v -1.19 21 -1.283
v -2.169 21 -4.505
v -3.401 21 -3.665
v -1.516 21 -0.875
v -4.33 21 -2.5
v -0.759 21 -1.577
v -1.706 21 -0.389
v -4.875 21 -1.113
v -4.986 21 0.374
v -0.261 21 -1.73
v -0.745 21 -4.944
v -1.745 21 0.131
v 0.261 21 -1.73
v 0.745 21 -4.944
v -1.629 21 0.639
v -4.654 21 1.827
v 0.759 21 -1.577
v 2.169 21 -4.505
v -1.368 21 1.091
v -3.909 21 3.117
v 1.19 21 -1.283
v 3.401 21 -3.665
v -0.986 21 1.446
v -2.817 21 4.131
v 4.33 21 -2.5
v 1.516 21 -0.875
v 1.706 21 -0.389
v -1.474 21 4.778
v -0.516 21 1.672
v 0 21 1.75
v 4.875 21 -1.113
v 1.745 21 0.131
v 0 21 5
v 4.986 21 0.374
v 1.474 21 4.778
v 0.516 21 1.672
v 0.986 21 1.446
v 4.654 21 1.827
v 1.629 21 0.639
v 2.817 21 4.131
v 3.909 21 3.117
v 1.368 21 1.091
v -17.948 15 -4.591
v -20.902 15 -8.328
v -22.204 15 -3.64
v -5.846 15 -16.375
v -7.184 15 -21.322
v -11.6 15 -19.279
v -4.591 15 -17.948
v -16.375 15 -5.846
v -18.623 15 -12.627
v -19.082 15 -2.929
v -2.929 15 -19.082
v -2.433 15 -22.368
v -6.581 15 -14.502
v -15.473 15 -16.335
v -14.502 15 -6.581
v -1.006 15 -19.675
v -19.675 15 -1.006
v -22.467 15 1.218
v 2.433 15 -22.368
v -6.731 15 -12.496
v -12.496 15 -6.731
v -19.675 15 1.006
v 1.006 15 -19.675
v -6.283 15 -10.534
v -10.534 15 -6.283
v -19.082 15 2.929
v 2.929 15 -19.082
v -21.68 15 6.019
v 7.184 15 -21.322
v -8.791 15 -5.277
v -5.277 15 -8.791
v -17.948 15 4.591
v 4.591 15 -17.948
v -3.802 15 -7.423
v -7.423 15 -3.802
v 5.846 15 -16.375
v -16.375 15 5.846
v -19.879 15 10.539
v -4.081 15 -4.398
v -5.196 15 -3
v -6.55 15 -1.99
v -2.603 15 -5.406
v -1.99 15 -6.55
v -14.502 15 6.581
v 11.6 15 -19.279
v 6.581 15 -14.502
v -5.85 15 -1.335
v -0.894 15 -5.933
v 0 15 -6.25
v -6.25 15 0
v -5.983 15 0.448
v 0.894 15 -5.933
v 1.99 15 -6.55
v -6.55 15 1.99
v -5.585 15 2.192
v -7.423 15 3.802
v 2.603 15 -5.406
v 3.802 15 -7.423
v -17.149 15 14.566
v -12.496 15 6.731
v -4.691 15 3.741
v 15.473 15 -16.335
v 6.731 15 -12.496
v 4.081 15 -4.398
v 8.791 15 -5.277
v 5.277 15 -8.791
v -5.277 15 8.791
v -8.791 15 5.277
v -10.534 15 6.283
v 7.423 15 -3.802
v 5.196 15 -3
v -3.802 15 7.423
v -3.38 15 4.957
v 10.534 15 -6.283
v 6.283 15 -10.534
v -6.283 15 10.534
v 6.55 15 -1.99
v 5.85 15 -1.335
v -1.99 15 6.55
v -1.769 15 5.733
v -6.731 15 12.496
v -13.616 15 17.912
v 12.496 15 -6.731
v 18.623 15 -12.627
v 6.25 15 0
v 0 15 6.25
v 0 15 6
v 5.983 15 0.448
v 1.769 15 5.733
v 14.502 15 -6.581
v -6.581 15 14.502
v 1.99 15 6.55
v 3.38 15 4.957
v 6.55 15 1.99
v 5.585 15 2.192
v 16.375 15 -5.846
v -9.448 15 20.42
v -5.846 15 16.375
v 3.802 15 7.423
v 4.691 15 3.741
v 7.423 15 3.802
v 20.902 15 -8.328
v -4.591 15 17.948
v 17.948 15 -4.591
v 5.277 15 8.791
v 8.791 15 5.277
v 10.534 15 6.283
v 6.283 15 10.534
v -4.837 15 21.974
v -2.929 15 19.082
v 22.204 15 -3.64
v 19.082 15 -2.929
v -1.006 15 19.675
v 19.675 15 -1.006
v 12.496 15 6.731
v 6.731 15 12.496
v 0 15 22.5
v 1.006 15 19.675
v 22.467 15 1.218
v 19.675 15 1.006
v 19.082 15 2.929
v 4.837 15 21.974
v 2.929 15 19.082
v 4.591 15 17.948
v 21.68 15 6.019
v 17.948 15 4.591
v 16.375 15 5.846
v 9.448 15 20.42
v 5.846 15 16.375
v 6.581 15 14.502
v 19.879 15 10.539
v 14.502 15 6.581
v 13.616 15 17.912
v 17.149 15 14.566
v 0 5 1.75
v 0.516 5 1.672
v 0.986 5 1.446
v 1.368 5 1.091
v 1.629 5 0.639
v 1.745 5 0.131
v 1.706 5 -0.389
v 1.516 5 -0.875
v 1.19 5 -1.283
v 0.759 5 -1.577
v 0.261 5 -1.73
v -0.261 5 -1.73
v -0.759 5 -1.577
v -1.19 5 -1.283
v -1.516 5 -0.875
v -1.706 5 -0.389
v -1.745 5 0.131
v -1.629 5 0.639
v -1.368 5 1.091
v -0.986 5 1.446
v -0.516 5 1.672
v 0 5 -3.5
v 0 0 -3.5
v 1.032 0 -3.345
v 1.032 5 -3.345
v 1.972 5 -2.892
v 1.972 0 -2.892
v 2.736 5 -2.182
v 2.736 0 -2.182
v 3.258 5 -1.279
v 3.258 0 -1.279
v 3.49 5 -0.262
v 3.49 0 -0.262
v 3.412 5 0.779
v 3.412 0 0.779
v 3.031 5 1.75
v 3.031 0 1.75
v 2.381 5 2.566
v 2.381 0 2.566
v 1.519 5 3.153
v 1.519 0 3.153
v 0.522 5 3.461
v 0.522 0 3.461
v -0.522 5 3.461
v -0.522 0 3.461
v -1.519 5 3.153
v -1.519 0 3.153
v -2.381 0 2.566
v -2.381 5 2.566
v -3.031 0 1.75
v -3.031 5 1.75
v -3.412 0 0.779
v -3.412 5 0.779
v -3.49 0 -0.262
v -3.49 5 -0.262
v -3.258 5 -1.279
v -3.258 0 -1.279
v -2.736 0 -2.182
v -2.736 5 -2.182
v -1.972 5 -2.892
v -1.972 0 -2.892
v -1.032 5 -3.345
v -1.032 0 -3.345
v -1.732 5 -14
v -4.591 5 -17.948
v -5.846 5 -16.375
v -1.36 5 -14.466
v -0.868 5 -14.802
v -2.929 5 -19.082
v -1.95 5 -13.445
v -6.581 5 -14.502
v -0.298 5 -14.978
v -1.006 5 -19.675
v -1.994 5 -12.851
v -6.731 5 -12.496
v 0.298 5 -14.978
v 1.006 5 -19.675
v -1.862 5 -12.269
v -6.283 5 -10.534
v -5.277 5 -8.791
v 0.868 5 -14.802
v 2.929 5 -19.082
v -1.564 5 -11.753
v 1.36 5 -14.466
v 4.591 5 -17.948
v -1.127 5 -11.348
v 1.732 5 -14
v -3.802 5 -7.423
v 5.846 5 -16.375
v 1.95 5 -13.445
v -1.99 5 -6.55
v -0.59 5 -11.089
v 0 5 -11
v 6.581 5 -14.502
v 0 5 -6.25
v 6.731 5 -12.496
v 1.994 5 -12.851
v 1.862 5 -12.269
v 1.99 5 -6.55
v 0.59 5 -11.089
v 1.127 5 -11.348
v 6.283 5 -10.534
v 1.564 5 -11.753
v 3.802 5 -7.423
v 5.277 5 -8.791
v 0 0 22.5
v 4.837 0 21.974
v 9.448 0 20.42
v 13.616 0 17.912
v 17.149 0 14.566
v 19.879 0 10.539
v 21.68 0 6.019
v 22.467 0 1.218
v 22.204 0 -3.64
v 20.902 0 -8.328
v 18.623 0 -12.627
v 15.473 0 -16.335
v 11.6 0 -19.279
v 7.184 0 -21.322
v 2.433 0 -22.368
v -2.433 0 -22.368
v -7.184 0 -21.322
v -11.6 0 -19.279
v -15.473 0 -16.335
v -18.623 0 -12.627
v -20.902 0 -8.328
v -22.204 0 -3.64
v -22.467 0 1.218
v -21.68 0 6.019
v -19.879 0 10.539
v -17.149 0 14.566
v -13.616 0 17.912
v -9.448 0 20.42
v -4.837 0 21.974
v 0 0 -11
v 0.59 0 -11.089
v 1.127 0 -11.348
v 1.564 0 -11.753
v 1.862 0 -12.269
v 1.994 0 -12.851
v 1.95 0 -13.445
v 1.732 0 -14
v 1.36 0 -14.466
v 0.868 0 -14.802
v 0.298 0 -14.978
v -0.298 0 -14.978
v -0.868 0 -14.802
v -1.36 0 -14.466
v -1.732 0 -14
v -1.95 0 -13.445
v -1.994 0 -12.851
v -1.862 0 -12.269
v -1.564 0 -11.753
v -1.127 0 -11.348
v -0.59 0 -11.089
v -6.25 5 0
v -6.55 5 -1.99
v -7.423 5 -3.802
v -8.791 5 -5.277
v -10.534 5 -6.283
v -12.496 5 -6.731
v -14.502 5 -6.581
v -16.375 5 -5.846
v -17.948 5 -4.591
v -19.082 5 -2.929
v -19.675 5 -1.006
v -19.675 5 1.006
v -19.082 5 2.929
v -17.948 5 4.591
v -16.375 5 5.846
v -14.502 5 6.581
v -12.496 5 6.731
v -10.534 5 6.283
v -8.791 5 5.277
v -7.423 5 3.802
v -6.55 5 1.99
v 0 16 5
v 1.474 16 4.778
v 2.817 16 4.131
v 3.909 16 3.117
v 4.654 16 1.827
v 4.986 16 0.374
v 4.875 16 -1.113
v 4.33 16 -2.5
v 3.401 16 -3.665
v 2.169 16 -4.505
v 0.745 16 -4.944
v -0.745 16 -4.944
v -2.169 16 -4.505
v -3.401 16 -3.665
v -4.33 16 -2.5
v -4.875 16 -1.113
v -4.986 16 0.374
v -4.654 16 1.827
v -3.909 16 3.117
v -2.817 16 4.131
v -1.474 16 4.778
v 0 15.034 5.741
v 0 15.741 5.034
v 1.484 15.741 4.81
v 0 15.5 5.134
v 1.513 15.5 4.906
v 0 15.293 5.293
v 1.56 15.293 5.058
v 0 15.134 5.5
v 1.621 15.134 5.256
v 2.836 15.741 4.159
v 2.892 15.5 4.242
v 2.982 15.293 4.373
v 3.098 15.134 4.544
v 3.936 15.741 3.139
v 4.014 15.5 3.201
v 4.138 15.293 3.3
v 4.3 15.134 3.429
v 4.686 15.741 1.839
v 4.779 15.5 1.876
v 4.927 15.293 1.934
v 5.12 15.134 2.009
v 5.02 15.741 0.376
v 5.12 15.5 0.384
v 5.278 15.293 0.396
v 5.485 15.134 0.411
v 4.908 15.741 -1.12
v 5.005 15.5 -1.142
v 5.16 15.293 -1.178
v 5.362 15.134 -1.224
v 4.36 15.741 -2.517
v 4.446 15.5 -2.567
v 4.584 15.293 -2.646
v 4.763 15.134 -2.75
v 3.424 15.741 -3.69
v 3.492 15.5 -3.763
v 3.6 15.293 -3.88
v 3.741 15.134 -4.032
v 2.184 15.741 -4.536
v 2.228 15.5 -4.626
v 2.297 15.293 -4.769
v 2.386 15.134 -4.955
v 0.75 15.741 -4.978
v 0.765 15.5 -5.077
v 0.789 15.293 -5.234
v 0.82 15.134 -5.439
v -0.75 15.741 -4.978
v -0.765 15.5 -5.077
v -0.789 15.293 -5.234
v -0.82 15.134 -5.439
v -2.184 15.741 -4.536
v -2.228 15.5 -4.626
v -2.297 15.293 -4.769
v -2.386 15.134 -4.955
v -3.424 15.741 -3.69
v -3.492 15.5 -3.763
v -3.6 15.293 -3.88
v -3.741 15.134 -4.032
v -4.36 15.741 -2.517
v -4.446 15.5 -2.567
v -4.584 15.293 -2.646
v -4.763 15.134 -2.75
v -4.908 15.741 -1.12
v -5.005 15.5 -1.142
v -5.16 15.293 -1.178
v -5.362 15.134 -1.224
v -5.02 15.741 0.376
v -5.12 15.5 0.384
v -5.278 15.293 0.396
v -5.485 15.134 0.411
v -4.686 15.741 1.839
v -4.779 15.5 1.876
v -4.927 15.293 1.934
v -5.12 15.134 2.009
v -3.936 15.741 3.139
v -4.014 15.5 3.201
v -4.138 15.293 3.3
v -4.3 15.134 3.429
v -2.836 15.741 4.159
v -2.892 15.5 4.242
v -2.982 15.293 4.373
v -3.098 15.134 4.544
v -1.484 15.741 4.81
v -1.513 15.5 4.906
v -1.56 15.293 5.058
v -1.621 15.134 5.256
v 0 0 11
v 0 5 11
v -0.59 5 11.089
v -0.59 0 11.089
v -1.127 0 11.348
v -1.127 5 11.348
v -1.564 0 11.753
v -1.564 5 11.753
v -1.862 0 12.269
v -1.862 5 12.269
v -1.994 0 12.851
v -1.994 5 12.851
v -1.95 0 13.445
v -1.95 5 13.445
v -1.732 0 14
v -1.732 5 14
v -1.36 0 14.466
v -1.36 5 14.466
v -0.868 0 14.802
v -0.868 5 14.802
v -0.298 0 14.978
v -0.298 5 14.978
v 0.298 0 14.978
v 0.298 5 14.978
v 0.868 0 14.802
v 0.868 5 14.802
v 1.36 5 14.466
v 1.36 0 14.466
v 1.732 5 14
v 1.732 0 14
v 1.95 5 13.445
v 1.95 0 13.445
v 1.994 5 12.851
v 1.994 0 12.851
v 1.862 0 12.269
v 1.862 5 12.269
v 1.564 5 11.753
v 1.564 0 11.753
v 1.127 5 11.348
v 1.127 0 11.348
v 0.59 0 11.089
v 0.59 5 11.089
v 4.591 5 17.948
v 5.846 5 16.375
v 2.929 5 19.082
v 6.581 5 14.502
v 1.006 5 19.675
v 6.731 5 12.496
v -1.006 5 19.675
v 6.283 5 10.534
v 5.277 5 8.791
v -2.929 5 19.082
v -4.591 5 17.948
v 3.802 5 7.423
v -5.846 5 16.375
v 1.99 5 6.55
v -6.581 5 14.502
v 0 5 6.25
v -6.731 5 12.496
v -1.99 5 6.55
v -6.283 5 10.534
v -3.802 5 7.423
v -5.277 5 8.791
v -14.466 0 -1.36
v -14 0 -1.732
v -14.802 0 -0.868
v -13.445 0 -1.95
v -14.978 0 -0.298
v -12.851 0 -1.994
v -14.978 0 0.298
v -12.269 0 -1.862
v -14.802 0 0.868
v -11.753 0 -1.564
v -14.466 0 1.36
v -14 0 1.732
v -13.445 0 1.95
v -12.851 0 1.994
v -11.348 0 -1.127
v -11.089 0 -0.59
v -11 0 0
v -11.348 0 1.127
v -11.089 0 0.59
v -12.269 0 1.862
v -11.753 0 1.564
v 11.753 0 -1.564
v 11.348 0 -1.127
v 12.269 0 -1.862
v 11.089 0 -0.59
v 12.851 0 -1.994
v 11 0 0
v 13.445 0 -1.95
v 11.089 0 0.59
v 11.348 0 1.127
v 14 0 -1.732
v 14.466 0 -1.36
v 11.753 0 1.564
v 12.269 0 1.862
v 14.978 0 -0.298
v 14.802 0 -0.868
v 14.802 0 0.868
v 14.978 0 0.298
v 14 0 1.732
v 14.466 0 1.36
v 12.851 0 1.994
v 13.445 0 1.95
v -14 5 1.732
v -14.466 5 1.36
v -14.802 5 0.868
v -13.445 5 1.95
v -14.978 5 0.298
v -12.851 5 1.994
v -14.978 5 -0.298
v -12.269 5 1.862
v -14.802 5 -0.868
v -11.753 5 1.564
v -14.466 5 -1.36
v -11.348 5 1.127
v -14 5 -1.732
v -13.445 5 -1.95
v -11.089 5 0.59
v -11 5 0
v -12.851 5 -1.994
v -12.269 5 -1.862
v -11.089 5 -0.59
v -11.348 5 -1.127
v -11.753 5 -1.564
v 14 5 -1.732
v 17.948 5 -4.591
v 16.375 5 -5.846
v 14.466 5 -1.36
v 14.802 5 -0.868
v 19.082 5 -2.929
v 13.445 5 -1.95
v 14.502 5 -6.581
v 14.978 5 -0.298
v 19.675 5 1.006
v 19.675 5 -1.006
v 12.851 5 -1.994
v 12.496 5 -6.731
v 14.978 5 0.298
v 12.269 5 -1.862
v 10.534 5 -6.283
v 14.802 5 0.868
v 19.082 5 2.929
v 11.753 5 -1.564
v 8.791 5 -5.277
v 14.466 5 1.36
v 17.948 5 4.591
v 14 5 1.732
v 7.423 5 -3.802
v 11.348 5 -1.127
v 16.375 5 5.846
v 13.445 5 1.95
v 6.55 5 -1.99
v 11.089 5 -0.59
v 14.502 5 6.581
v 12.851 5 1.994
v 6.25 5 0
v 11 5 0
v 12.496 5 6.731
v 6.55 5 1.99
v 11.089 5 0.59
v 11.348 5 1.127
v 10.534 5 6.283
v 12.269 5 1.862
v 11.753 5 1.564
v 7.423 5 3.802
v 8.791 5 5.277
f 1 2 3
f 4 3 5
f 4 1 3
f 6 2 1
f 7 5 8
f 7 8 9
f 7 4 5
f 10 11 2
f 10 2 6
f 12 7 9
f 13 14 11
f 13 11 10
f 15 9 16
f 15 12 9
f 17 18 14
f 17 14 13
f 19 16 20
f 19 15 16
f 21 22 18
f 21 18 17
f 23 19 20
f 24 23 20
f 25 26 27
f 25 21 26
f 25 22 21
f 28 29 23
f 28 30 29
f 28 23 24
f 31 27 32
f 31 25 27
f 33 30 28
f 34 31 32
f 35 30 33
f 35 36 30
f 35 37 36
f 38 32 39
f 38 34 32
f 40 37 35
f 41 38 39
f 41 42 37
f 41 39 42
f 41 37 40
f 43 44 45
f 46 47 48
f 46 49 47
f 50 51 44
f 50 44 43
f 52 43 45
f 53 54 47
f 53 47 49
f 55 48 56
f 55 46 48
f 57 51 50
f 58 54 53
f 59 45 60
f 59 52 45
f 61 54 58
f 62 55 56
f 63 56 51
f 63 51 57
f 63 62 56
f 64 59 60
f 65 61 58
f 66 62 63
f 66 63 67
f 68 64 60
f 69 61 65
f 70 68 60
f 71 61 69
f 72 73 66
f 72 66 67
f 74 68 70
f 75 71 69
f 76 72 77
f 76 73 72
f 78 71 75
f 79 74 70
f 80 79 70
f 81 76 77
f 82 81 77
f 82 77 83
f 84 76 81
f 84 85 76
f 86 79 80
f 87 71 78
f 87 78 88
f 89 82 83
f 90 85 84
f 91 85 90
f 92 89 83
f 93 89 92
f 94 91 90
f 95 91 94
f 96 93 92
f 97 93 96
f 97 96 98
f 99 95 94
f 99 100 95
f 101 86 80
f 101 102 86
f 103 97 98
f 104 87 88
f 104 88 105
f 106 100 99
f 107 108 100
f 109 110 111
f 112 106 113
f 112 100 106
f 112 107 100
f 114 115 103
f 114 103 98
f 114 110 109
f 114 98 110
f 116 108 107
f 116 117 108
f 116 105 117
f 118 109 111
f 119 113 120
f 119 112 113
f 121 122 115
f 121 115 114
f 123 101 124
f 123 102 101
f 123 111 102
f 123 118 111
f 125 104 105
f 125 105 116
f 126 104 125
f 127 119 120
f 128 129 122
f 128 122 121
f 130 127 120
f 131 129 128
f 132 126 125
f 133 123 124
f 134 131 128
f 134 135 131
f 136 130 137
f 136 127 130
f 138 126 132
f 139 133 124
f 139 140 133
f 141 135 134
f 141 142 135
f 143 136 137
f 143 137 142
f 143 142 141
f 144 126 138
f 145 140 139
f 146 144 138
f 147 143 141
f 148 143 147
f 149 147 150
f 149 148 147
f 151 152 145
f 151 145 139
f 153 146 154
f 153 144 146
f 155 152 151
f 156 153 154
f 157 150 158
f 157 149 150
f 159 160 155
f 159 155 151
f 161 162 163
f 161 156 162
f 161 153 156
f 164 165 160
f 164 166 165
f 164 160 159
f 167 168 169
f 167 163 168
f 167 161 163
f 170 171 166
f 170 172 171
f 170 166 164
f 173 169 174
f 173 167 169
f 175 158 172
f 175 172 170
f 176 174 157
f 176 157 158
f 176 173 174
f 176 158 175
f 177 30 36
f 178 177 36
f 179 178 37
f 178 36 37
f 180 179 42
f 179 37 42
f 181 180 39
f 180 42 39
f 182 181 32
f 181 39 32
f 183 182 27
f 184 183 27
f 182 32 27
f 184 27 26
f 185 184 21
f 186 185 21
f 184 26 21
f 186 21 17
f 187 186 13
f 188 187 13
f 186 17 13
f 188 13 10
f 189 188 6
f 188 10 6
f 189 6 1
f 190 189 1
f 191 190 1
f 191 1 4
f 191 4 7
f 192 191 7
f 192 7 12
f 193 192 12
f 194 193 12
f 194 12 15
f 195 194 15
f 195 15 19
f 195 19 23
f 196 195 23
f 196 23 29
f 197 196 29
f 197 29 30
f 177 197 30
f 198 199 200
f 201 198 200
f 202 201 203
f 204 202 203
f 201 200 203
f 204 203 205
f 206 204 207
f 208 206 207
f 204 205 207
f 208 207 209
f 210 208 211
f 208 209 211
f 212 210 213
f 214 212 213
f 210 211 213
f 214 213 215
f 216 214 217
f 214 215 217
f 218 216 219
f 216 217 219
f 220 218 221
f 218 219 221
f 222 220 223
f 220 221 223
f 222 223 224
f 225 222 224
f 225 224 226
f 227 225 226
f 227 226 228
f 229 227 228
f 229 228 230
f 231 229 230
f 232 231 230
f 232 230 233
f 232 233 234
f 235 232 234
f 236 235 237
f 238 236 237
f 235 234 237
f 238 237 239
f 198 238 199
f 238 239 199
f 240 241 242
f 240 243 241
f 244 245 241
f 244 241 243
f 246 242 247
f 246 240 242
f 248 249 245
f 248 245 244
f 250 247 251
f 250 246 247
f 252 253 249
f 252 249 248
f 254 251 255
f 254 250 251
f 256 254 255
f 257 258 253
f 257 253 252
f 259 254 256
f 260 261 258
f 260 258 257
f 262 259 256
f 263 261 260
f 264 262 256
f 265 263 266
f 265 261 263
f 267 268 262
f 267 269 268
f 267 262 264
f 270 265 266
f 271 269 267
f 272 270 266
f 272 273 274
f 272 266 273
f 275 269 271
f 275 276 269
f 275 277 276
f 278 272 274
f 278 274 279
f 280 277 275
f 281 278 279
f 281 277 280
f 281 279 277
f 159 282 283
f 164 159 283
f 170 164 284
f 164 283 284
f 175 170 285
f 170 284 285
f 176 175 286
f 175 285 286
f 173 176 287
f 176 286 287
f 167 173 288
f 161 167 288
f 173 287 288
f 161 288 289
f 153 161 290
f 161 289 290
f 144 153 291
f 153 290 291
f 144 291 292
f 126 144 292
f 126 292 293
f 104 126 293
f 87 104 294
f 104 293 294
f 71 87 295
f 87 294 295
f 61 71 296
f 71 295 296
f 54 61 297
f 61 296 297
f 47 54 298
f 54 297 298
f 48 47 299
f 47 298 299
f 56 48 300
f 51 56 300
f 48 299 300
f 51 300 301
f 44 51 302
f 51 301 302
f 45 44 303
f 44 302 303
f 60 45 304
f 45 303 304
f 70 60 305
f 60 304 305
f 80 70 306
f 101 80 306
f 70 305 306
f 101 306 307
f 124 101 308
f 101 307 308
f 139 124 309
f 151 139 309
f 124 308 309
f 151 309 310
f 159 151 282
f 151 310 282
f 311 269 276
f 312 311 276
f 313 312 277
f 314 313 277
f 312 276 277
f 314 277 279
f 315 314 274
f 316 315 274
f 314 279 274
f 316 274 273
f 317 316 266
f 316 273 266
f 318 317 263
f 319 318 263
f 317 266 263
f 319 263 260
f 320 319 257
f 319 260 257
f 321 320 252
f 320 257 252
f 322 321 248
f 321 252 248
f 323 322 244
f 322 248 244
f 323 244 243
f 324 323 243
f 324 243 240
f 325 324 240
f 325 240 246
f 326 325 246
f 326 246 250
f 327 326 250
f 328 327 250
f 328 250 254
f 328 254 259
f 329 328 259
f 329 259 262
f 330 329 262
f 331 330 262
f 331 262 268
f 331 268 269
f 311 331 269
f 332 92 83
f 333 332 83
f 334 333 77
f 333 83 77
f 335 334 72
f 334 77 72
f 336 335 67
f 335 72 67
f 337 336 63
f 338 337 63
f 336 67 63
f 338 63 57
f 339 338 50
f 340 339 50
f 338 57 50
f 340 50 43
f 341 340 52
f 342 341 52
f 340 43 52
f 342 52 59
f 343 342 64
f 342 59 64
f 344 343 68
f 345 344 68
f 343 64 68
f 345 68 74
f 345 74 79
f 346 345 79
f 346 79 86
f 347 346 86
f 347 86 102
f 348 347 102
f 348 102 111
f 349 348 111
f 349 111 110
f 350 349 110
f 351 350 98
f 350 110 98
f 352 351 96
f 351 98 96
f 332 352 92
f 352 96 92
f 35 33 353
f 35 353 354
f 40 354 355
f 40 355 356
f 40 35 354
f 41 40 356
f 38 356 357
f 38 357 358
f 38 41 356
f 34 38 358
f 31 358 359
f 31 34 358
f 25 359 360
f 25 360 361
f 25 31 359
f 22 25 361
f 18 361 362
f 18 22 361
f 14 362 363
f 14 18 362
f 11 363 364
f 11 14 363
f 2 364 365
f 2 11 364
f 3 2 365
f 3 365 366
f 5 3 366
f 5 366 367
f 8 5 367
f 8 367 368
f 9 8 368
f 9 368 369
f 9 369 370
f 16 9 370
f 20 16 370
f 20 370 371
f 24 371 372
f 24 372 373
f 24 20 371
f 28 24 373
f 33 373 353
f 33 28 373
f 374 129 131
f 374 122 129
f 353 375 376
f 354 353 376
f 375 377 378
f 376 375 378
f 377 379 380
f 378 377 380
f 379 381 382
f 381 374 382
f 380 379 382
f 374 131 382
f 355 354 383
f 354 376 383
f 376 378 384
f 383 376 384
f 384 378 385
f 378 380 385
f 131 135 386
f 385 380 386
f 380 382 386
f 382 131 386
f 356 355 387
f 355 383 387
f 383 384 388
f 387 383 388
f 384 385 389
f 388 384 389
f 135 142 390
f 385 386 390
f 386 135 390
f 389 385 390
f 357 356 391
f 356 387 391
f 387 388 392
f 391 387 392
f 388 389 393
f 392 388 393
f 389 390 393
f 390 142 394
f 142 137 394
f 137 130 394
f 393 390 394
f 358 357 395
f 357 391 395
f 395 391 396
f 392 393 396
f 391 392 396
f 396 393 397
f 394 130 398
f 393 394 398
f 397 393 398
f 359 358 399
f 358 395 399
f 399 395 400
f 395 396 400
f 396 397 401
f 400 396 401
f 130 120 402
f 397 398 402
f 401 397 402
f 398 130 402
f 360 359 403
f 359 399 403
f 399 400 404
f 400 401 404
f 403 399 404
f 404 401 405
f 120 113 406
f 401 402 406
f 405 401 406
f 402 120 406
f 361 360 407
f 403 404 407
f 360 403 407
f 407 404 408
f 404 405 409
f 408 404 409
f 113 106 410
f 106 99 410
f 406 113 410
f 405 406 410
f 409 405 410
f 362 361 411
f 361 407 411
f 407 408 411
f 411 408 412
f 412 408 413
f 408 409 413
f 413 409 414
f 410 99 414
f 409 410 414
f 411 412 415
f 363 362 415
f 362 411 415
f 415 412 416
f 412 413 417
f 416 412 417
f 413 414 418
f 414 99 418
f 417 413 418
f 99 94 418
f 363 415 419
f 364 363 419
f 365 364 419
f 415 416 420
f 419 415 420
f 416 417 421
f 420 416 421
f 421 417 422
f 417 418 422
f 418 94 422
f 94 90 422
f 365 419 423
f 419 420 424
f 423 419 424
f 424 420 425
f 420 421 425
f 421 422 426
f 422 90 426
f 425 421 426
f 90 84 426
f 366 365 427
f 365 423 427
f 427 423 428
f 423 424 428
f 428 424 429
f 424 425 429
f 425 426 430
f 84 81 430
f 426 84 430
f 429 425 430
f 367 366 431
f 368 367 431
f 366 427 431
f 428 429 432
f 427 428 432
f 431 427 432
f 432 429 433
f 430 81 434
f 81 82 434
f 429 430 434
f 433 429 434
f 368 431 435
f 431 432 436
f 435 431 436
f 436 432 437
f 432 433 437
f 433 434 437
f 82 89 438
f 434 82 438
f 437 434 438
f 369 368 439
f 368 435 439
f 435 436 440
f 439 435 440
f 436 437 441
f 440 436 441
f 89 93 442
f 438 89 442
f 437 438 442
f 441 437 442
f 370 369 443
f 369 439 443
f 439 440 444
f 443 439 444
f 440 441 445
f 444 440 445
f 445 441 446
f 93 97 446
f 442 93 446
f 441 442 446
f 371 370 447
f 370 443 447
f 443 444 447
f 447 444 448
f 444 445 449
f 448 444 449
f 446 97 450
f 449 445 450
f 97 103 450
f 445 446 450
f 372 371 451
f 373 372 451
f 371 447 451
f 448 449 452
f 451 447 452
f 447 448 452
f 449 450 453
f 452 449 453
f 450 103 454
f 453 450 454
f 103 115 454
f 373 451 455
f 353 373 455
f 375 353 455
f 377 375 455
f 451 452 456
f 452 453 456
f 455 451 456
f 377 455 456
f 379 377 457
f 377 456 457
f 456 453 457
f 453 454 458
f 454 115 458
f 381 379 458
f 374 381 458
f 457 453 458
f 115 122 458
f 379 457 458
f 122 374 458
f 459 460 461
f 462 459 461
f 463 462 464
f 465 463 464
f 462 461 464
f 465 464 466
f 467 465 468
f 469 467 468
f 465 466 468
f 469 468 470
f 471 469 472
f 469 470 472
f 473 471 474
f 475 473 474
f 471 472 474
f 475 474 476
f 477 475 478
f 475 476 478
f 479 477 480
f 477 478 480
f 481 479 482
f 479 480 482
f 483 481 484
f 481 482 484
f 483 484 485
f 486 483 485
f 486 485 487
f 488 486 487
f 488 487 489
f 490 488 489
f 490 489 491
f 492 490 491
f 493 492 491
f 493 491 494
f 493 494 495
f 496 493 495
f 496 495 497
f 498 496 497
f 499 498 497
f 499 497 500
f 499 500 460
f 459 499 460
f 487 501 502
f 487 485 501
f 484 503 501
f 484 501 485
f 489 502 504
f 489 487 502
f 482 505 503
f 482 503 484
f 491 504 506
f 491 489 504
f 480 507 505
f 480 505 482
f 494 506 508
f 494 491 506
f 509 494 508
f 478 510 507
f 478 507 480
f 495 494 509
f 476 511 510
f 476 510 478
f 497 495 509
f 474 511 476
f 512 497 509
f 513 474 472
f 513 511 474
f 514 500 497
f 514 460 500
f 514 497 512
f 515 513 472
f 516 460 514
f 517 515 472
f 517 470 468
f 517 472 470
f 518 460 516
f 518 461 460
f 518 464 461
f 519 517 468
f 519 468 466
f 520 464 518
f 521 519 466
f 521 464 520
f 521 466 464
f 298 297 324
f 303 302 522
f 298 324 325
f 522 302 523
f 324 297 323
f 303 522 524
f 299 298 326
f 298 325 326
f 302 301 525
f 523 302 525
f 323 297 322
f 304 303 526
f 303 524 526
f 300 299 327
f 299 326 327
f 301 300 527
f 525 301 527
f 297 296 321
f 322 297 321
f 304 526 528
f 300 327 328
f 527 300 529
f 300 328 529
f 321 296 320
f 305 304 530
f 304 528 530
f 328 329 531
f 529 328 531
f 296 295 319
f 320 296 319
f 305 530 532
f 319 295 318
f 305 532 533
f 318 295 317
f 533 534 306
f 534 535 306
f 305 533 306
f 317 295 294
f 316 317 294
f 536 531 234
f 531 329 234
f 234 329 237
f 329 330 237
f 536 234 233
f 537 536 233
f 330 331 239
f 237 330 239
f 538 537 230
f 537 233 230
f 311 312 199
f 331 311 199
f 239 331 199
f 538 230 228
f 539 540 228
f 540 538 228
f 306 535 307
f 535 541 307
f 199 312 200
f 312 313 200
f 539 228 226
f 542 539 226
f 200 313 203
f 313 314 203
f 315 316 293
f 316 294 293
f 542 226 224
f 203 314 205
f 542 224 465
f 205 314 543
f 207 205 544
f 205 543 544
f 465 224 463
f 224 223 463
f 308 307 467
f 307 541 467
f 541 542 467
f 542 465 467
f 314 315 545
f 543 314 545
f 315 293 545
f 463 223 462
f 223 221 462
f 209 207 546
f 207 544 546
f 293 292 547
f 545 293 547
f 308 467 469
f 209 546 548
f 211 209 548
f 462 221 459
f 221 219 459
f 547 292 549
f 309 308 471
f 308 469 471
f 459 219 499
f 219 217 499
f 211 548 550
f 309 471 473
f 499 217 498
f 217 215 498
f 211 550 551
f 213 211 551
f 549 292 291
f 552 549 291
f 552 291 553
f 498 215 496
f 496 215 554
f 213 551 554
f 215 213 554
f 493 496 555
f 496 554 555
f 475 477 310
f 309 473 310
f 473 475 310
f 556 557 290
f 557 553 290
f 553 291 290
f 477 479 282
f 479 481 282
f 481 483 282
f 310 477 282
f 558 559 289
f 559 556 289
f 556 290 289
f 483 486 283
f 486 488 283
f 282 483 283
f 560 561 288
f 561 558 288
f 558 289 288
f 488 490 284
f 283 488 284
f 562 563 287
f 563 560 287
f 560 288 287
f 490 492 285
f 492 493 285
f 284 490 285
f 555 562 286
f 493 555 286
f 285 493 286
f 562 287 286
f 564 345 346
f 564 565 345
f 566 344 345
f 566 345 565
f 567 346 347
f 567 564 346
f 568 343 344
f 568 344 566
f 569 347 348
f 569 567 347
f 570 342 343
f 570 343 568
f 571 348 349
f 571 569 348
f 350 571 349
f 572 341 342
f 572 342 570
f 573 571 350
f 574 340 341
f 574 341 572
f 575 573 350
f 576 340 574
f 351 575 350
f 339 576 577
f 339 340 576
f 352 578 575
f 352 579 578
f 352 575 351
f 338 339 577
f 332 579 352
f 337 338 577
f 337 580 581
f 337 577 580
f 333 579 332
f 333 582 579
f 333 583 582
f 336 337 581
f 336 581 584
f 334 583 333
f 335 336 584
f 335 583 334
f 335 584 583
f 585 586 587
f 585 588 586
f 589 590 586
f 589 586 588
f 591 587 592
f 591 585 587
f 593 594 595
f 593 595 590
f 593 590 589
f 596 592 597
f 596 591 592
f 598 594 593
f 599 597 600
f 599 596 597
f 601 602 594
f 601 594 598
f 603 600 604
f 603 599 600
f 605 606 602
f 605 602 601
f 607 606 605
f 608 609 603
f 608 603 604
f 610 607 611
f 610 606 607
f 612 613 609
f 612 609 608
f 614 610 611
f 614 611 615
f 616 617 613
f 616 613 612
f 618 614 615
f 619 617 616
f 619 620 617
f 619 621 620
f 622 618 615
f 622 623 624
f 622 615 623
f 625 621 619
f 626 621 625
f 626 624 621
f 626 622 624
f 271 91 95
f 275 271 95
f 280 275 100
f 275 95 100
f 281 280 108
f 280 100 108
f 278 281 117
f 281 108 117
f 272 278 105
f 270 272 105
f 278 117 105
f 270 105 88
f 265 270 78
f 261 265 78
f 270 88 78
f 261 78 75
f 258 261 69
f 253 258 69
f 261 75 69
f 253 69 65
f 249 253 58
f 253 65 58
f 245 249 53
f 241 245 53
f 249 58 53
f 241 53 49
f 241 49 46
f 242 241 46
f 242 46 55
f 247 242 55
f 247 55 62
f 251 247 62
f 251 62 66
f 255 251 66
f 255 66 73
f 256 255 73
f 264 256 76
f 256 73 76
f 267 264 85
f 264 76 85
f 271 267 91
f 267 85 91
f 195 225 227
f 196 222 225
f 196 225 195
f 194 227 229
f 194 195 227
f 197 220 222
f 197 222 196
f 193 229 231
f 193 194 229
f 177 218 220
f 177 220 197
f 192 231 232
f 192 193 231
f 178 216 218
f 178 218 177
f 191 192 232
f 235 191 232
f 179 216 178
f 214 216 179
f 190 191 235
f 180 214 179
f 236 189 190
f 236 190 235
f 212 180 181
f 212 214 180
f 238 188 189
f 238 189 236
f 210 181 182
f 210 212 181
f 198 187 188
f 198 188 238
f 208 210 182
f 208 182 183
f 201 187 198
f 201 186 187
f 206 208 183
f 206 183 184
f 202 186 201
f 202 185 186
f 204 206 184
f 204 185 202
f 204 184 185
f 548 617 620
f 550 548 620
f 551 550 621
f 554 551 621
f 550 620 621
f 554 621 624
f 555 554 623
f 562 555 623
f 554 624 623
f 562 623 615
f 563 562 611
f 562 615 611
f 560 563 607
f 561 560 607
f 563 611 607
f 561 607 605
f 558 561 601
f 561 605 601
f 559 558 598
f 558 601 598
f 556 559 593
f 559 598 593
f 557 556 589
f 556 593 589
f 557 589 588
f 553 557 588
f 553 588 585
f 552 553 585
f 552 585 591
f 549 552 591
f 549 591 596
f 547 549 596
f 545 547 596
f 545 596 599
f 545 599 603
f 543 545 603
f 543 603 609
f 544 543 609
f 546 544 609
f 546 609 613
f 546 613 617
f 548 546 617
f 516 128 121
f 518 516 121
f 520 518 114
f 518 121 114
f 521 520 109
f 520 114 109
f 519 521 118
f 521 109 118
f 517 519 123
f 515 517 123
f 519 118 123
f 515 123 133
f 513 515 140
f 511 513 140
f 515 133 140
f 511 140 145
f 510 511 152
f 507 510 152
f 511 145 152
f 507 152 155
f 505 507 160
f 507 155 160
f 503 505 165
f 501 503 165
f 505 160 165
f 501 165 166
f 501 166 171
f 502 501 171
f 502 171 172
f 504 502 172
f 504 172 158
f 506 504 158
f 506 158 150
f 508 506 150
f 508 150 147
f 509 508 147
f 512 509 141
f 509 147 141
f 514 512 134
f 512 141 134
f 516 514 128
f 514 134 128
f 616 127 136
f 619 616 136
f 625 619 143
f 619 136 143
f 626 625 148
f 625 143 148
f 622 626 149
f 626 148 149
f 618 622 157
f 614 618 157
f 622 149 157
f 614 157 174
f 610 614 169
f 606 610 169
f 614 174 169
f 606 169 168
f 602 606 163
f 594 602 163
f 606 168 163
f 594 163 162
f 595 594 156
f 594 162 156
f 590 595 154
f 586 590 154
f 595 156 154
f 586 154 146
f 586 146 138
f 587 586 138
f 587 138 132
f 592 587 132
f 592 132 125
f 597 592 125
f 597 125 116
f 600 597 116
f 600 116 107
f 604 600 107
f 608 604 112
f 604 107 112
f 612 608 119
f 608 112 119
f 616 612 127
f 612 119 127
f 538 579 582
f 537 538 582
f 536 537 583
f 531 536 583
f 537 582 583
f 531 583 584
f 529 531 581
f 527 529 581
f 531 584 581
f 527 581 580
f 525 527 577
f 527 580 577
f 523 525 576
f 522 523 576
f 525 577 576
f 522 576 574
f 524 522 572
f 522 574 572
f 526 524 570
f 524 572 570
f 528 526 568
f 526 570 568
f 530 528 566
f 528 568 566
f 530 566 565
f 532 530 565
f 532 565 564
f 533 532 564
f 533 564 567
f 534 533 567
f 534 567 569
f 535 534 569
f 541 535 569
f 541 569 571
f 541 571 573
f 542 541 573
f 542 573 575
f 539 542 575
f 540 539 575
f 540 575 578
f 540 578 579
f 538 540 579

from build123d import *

# Parameters (mm, degrees)
SKETCH1_R           = 22.5
BOSS_EXTRUDE1_DEPTH = 15
SKETCH2_R           = 6.75
CUT_EXTRUDE1_DEPTH  = 10
SKETCH3_R           = 2
CUT_EXTRUDE2_DEPTH  = 35
CIRPATTERN1_COUNT   = 4
SKETCH6_R           = 1.75
CUT_EXTRUDE4_DEPTH  = 45
BOSS_EXTRUDE2_START = 6
SKETCH7_R           = 5
SKETCH7_R_2         = 1.75
BOSS_EXTRUDE2_DEPTH = 6
FILLET1_R           = 1
SKETCH8_R           = 3.5
CUT_EXTRUDE5_DEPTH  = 5


with BuildPart() as part:
    # Sketch1 → Boss-Extrude1 (new body)
    with BuildSketch(Plane(origin=(0, 0, 0), x_dir=(1, 0, 0), z_dir=(0, 1, 0))):
        with Locations(Location((0, 0, 0), (0, 0, 270))):
            Circle(SKETCH1_R)
    extrude(amount=BOSS_EXTRUDE1_DEPTH)

    # Sketch2 → Cut-Extrude1 (cut)
    with BuildSketch(Plane(origin=(0, 15, 0), x_dir=(1, 0, 0), z_dir=(0, 1, 0))):
        with Locations(Location((0, 13, 0), (0, 0, 270))):
            Circle(SKETCH2_R)
    cut_extrude1 = extrude(amount=-CUT_EXTRUDE1_DEPTH, mode=Mode.SUBTRACT)

    # Sketch3 → Cut-Extrude2 (cut)
    with BuildSketch(Plane(origin=(0, 5, 0), x_dir=(1, 0, 0), z_dir=(0, 1, 0))):
        with Locations(Location((0, 13, 0), (0, 0, 270))):
            Circle(SKETCH3_R)
    cut_extrude2 = extrude(amount=-CUT_EXTRUDE2_DEPTH, mode=Mode.SUBTRACT)

    # CirPattern1: Cut-Extrude1, Cut-Extrude2 ×4 about axis
    cirpattern1_axis = Axis((0, 0, 0), (0, 1, 0))
    add([cut_extrude1.rotate(cirpattern1_axis, i * 360 / CIRPATTERN1_COUNT) for i in range(1, CIRPATTERN1_COUNT)], mode=Mode.SUBTRACT)
    add([cut_extrude2.rotate(cirpattern1_axis, i * 360 / CIRPATTERN1_COUNT) for i in range(1, CIRPATTERN1_COUNT)], mode=Mode.SUBTRACT)

    # Sketch6 → Cut-Extrude4 (cut)
    with BuildSketch(Plane(origin=(0, 15, 0), x_dir=(1, 0, 0), z_dir=(0, 1, 0))):
        with Locations(Location((0, 0, 0), (0, 0, 270))):
            Circle(SKETCH6_R)
    extrude(amount=-CUT_EXTRUDE4_DEPTH, mode=Mode.SUBTRACT)

    # Sketch7 → Boss-Extrude2 (add)
    with BuildSketch(Plane(origin=(0, 15, 0), x_dir=(1, 0, 0), z_dir=(0, 1, 0)).offset(BOSS_EXTRUDE2_START)):
        with Locations(Location((0, 0, 0), (0, 0, 270))):
            Circle(SKETCH7_R)
        with Locations(Location((0, 0, 0), (0, 0, 270))):
            Circle(SKETCH7_R_2, mode=Mode.SUBTRACT)
    extrude(amount=-BOSS_EXTRUDE2_DEPTH)

    # Fillet1
    fillet1_edges = [part.edges().sort_by_distance(p)[0] for p in [
        (0, 15, -5),
    ]]
    fillet(fillet1_edges, radius=FILLET1_R)

    # Sketch8 → Cut-Extrude5 (cut)
    with BuildSketch(Plane.XZ):
        with Locations(Location((0, 0, 0), (0, 0, 270))):
            Circle(SKETCH8_R)
    extrude(amount=-CUT_EXTRUDE5_DEPTH, mode=Mode.SUBTRACT)


solid = part.part
